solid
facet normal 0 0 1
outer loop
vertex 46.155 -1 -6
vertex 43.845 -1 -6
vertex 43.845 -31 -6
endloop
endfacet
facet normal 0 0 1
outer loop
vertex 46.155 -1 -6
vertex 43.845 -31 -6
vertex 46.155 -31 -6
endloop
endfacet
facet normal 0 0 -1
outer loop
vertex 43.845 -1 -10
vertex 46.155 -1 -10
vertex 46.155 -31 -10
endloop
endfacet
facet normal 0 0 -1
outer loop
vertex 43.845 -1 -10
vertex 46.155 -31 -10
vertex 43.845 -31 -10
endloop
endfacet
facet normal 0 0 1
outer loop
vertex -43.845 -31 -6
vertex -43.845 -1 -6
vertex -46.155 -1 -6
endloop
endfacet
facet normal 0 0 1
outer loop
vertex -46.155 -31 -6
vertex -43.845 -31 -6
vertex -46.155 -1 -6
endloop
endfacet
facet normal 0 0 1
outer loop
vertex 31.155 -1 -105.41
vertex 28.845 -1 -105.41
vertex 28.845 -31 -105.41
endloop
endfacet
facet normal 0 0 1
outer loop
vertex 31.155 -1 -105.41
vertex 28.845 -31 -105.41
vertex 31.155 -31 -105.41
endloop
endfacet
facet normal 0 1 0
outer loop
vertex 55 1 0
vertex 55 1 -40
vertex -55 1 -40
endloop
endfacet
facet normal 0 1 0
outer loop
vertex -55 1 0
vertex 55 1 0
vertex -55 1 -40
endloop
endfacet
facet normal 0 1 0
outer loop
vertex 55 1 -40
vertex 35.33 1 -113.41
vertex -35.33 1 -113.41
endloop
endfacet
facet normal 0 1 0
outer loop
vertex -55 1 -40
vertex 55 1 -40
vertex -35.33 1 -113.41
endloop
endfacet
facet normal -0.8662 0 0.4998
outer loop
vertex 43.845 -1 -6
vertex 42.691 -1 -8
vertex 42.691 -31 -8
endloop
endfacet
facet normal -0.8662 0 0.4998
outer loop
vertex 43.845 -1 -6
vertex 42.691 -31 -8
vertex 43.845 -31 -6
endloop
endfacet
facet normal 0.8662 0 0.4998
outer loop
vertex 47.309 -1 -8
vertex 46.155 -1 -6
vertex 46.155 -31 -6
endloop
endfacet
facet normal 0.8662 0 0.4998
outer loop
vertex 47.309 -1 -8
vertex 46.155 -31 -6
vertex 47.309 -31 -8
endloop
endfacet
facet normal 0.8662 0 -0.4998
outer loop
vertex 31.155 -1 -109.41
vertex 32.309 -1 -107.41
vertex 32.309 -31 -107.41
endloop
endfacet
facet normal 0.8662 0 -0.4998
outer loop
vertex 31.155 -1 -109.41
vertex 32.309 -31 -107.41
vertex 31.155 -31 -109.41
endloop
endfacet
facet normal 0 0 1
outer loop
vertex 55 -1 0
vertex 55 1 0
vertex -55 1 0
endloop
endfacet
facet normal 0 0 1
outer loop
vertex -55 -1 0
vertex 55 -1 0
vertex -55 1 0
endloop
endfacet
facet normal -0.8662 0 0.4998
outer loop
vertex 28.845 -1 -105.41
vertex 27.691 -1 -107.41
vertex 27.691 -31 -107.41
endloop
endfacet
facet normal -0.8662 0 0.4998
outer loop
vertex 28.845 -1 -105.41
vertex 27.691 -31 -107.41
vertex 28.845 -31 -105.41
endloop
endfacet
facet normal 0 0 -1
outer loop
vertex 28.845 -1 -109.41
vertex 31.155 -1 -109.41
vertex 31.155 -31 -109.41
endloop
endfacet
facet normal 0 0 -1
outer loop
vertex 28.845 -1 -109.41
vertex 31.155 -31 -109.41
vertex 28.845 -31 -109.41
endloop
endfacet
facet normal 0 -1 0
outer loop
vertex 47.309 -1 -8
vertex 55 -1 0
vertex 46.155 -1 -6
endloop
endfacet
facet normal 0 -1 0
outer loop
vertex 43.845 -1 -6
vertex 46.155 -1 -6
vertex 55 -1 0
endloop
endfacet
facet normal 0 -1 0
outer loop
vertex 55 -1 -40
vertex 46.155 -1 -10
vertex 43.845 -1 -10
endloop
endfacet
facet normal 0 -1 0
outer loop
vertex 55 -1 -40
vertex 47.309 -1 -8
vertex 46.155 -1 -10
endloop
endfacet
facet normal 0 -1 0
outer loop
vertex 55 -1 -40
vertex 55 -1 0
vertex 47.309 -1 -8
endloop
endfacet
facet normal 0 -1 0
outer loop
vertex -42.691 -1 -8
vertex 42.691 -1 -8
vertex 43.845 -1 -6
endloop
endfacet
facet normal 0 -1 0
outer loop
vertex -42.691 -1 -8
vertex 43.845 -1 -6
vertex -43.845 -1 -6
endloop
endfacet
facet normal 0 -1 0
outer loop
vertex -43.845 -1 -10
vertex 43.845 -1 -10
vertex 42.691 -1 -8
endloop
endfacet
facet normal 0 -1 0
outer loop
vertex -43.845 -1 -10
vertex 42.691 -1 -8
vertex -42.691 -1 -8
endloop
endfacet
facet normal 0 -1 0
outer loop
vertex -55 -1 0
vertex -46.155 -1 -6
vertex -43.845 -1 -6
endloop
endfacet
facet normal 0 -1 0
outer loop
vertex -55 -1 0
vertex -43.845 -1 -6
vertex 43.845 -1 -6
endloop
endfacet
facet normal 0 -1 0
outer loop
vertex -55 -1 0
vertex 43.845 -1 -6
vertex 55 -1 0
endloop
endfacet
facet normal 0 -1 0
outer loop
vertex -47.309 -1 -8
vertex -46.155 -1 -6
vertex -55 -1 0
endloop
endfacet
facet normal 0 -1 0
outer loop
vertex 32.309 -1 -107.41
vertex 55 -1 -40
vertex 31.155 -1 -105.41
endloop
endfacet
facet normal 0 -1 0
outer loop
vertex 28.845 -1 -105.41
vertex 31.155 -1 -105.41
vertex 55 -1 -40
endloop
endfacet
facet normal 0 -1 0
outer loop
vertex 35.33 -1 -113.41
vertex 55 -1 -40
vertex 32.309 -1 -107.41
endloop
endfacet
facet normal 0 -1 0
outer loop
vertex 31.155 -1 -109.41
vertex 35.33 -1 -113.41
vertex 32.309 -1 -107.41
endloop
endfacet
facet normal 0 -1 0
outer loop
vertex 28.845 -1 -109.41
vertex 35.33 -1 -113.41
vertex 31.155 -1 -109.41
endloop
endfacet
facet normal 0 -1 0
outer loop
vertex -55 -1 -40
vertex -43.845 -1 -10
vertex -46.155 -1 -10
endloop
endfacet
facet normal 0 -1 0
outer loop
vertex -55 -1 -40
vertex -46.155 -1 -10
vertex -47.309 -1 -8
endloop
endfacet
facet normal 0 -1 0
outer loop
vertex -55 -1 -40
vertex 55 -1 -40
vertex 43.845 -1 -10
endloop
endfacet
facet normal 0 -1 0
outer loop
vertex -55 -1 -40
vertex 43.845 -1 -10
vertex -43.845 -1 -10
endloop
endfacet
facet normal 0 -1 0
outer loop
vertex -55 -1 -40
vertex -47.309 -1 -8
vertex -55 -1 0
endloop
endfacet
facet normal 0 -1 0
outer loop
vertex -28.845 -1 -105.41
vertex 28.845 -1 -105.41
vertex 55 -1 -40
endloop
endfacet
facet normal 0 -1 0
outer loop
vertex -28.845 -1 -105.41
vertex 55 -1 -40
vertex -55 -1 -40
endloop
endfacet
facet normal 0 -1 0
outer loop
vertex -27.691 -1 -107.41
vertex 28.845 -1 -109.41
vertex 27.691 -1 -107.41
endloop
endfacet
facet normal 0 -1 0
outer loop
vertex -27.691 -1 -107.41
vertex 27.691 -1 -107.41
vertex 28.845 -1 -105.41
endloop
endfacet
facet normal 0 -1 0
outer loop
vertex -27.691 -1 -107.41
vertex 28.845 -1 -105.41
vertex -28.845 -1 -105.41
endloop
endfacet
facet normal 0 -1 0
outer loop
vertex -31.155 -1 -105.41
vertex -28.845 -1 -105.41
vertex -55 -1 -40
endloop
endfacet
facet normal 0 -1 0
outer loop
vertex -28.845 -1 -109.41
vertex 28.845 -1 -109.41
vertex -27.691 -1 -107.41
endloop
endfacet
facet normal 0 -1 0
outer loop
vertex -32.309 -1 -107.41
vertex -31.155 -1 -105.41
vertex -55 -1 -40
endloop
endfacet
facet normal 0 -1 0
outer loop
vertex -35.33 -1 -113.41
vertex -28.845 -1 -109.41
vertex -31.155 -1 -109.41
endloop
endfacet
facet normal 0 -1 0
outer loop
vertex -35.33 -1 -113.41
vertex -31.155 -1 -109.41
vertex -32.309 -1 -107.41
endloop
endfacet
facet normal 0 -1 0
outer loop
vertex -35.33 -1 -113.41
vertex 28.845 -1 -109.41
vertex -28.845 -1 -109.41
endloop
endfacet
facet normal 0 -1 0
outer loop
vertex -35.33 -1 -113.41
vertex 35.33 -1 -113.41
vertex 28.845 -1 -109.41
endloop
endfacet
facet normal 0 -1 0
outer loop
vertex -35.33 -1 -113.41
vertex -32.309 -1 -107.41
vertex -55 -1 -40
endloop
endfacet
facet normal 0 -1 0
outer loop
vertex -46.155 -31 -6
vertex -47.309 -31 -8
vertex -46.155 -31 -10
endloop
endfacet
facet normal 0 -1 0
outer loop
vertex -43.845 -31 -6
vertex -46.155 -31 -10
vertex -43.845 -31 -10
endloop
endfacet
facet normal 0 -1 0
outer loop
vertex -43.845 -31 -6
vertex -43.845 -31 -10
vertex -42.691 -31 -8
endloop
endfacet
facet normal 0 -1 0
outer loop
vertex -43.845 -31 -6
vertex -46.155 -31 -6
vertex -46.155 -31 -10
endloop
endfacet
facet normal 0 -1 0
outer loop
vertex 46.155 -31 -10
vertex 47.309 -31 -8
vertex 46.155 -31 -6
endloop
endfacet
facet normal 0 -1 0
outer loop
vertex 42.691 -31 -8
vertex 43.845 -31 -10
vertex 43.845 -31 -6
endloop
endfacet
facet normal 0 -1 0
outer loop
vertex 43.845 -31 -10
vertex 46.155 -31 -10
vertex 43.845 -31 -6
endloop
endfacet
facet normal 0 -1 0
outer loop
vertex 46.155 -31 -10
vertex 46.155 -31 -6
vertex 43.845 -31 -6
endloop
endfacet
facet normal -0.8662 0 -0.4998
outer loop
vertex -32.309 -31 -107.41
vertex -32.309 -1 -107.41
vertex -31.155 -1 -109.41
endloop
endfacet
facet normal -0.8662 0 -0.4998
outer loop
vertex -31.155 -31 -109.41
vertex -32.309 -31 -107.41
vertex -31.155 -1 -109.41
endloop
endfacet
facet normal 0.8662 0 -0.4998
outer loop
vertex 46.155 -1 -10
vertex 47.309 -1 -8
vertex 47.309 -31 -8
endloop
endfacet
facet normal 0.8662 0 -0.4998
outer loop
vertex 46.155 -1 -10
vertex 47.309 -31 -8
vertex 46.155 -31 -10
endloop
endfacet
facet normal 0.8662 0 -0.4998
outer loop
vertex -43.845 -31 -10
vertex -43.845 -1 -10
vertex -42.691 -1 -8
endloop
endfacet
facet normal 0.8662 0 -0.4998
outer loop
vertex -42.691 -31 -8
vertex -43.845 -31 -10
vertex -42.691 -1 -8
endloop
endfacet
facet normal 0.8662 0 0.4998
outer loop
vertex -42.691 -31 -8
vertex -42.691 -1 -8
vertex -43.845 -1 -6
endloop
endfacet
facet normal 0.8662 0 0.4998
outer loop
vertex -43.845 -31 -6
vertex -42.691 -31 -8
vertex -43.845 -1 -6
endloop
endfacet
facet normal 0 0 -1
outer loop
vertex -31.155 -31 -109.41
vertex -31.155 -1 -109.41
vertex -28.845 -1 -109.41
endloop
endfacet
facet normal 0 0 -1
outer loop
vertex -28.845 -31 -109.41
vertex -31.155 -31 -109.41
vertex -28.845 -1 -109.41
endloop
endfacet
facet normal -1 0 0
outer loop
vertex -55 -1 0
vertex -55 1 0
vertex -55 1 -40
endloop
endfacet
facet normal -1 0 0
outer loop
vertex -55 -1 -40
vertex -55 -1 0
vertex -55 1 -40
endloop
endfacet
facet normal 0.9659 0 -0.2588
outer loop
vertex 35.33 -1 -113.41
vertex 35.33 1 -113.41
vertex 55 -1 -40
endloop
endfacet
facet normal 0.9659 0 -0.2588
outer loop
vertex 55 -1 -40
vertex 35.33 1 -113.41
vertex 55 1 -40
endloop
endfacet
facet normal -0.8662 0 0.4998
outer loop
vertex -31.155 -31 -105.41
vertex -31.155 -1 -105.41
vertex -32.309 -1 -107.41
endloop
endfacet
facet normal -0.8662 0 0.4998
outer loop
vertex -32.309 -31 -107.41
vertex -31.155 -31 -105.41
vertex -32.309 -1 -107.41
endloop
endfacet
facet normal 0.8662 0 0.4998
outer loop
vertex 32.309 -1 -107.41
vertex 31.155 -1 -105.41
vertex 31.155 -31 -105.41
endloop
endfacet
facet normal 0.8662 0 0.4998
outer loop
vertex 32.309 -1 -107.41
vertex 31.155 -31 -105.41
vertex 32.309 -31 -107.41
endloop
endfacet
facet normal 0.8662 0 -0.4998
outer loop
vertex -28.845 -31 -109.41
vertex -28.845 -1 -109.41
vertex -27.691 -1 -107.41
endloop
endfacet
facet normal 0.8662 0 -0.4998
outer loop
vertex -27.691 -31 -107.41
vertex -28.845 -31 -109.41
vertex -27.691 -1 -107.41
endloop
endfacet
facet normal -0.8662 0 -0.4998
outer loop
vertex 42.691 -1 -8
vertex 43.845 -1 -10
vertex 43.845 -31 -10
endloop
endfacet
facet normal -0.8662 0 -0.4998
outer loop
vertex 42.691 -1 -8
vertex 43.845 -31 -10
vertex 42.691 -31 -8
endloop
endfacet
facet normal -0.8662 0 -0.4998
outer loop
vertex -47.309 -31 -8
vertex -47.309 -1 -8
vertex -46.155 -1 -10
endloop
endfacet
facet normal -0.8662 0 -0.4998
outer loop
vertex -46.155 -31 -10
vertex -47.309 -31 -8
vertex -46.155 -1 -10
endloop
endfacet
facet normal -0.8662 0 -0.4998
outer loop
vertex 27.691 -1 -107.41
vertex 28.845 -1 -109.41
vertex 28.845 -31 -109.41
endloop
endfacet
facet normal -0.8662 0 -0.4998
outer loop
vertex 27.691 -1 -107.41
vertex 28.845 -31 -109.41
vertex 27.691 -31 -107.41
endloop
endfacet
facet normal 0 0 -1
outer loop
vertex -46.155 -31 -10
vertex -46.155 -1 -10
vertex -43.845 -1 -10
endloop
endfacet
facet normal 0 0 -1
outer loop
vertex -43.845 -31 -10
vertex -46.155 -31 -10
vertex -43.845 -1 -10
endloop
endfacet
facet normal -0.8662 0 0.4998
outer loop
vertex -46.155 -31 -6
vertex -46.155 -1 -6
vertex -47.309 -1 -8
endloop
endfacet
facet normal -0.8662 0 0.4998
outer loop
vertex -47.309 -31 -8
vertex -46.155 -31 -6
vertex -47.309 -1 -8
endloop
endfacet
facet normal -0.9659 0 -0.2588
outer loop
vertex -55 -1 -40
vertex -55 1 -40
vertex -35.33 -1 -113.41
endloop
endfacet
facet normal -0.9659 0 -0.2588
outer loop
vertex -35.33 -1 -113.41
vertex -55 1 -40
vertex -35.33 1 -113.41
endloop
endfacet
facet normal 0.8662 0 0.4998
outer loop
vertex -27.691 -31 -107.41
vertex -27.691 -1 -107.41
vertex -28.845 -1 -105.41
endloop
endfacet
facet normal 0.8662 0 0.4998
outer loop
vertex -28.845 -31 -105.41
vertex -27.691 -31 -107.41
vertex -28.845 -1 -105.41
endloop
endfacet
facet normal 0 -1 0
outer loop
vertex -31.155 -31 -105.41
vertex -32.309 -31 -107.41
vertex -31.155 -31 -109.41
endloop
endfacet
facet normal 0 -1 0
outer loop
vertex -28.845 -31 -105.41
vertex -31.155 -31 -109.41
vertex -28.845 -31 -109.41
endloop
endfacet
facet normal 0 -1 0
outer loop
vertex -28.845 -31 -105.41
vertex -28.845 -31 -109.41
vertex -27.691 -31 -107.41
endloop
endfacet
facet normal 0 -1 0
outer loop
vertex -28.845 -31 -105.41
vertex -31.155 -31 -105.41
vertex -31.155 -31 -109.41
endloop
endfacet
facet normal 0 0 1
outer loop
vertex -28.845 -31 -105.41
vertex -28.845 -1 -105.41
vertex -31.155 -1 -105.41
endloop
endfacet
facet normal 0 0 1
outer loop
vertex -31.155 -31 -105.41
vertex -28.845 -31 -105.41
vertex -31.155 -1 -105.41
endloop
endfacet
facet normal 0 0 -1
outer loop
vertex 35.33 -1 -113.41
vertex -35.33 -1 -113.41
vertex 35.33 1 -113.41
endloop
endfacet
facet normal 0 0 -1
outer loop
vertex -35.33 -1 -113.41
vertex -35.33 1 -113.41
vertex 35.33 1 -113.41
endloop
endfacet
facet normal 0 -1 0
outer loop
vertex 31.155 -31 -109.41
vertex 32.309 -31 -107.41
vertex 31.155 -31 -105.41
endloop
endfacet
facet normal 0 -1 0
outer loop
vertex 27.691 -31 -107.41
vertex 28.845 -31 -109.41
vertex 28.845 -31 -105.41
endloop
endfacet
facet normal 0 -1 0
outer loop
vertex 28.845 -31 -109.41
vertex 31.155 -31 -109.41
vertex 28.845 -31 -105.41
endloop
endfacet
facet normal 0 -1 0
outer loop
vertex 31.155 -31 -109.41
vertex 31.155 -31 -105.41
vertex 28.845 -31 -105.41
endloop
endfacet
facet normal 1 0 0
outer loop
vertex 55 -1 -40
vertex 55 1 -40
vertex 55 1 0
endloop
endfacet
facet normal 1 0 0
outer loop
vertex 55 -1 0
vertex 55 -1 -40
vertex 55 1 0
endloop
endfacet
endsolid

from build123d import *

# Parameters (mm, degrees)
EXTRUDE_1_DEPTH = 1
EXTRUDE_2_DEPTH = 30


with BuildPart() as part:
    # 草图1 → 凸台-拉伸1 (new, symmetric)
    with BuildSketch(Plane(origin=(0, 0, 0), x_dir=(1, 0, 0), z_dir=(0, 1, 0))):
        Polygon((-55, 0), (-55, 40), (-35.329752572, 113.410362798), (35.329752572, 113.410362798), (55, 40), (55, 0), align=None)
    extrude(amount=EXTRUDE_1_DEPTH, both=True)

    # 草图2 → 凸台-拉伸2 (add)
    with BuildSketch(Plane.XZ.offset(1)):
        Polygon((-42.690598923, -8), (-43.845299462, -6), (-46.154700538, -6), (-47.309401077, -8), (-46.154700538, -10), (-43.845299462, -10), align=None)
        Polygon((-27.690598923, -107.410362798), (-28.845299462, -105.410362798), (-31.154700538, -105.410362798), (-32.309401077, -107.410362798), (-31.154700538, -109.410362798), (-28.845299462, -109.410362798), align=None)
        Polygon((28.845299462, -109.410362798), (27.690598923, -107.410362798), (28.845299462, -105.410362798), (31.154700538, -105.410362798), (32.309401077, -107.410362798), (31.154700538, -109.410362798), align=None)
        Polygon((43.845299462, -10), (42.690598923, -8), (43.845299462, -6), (46.154700538, -6), (47.309401077, -8), (46.154700538, -10), align=None)
    extrude(amount=EXTRUDE_2_DEPTH)


solid = part.part
